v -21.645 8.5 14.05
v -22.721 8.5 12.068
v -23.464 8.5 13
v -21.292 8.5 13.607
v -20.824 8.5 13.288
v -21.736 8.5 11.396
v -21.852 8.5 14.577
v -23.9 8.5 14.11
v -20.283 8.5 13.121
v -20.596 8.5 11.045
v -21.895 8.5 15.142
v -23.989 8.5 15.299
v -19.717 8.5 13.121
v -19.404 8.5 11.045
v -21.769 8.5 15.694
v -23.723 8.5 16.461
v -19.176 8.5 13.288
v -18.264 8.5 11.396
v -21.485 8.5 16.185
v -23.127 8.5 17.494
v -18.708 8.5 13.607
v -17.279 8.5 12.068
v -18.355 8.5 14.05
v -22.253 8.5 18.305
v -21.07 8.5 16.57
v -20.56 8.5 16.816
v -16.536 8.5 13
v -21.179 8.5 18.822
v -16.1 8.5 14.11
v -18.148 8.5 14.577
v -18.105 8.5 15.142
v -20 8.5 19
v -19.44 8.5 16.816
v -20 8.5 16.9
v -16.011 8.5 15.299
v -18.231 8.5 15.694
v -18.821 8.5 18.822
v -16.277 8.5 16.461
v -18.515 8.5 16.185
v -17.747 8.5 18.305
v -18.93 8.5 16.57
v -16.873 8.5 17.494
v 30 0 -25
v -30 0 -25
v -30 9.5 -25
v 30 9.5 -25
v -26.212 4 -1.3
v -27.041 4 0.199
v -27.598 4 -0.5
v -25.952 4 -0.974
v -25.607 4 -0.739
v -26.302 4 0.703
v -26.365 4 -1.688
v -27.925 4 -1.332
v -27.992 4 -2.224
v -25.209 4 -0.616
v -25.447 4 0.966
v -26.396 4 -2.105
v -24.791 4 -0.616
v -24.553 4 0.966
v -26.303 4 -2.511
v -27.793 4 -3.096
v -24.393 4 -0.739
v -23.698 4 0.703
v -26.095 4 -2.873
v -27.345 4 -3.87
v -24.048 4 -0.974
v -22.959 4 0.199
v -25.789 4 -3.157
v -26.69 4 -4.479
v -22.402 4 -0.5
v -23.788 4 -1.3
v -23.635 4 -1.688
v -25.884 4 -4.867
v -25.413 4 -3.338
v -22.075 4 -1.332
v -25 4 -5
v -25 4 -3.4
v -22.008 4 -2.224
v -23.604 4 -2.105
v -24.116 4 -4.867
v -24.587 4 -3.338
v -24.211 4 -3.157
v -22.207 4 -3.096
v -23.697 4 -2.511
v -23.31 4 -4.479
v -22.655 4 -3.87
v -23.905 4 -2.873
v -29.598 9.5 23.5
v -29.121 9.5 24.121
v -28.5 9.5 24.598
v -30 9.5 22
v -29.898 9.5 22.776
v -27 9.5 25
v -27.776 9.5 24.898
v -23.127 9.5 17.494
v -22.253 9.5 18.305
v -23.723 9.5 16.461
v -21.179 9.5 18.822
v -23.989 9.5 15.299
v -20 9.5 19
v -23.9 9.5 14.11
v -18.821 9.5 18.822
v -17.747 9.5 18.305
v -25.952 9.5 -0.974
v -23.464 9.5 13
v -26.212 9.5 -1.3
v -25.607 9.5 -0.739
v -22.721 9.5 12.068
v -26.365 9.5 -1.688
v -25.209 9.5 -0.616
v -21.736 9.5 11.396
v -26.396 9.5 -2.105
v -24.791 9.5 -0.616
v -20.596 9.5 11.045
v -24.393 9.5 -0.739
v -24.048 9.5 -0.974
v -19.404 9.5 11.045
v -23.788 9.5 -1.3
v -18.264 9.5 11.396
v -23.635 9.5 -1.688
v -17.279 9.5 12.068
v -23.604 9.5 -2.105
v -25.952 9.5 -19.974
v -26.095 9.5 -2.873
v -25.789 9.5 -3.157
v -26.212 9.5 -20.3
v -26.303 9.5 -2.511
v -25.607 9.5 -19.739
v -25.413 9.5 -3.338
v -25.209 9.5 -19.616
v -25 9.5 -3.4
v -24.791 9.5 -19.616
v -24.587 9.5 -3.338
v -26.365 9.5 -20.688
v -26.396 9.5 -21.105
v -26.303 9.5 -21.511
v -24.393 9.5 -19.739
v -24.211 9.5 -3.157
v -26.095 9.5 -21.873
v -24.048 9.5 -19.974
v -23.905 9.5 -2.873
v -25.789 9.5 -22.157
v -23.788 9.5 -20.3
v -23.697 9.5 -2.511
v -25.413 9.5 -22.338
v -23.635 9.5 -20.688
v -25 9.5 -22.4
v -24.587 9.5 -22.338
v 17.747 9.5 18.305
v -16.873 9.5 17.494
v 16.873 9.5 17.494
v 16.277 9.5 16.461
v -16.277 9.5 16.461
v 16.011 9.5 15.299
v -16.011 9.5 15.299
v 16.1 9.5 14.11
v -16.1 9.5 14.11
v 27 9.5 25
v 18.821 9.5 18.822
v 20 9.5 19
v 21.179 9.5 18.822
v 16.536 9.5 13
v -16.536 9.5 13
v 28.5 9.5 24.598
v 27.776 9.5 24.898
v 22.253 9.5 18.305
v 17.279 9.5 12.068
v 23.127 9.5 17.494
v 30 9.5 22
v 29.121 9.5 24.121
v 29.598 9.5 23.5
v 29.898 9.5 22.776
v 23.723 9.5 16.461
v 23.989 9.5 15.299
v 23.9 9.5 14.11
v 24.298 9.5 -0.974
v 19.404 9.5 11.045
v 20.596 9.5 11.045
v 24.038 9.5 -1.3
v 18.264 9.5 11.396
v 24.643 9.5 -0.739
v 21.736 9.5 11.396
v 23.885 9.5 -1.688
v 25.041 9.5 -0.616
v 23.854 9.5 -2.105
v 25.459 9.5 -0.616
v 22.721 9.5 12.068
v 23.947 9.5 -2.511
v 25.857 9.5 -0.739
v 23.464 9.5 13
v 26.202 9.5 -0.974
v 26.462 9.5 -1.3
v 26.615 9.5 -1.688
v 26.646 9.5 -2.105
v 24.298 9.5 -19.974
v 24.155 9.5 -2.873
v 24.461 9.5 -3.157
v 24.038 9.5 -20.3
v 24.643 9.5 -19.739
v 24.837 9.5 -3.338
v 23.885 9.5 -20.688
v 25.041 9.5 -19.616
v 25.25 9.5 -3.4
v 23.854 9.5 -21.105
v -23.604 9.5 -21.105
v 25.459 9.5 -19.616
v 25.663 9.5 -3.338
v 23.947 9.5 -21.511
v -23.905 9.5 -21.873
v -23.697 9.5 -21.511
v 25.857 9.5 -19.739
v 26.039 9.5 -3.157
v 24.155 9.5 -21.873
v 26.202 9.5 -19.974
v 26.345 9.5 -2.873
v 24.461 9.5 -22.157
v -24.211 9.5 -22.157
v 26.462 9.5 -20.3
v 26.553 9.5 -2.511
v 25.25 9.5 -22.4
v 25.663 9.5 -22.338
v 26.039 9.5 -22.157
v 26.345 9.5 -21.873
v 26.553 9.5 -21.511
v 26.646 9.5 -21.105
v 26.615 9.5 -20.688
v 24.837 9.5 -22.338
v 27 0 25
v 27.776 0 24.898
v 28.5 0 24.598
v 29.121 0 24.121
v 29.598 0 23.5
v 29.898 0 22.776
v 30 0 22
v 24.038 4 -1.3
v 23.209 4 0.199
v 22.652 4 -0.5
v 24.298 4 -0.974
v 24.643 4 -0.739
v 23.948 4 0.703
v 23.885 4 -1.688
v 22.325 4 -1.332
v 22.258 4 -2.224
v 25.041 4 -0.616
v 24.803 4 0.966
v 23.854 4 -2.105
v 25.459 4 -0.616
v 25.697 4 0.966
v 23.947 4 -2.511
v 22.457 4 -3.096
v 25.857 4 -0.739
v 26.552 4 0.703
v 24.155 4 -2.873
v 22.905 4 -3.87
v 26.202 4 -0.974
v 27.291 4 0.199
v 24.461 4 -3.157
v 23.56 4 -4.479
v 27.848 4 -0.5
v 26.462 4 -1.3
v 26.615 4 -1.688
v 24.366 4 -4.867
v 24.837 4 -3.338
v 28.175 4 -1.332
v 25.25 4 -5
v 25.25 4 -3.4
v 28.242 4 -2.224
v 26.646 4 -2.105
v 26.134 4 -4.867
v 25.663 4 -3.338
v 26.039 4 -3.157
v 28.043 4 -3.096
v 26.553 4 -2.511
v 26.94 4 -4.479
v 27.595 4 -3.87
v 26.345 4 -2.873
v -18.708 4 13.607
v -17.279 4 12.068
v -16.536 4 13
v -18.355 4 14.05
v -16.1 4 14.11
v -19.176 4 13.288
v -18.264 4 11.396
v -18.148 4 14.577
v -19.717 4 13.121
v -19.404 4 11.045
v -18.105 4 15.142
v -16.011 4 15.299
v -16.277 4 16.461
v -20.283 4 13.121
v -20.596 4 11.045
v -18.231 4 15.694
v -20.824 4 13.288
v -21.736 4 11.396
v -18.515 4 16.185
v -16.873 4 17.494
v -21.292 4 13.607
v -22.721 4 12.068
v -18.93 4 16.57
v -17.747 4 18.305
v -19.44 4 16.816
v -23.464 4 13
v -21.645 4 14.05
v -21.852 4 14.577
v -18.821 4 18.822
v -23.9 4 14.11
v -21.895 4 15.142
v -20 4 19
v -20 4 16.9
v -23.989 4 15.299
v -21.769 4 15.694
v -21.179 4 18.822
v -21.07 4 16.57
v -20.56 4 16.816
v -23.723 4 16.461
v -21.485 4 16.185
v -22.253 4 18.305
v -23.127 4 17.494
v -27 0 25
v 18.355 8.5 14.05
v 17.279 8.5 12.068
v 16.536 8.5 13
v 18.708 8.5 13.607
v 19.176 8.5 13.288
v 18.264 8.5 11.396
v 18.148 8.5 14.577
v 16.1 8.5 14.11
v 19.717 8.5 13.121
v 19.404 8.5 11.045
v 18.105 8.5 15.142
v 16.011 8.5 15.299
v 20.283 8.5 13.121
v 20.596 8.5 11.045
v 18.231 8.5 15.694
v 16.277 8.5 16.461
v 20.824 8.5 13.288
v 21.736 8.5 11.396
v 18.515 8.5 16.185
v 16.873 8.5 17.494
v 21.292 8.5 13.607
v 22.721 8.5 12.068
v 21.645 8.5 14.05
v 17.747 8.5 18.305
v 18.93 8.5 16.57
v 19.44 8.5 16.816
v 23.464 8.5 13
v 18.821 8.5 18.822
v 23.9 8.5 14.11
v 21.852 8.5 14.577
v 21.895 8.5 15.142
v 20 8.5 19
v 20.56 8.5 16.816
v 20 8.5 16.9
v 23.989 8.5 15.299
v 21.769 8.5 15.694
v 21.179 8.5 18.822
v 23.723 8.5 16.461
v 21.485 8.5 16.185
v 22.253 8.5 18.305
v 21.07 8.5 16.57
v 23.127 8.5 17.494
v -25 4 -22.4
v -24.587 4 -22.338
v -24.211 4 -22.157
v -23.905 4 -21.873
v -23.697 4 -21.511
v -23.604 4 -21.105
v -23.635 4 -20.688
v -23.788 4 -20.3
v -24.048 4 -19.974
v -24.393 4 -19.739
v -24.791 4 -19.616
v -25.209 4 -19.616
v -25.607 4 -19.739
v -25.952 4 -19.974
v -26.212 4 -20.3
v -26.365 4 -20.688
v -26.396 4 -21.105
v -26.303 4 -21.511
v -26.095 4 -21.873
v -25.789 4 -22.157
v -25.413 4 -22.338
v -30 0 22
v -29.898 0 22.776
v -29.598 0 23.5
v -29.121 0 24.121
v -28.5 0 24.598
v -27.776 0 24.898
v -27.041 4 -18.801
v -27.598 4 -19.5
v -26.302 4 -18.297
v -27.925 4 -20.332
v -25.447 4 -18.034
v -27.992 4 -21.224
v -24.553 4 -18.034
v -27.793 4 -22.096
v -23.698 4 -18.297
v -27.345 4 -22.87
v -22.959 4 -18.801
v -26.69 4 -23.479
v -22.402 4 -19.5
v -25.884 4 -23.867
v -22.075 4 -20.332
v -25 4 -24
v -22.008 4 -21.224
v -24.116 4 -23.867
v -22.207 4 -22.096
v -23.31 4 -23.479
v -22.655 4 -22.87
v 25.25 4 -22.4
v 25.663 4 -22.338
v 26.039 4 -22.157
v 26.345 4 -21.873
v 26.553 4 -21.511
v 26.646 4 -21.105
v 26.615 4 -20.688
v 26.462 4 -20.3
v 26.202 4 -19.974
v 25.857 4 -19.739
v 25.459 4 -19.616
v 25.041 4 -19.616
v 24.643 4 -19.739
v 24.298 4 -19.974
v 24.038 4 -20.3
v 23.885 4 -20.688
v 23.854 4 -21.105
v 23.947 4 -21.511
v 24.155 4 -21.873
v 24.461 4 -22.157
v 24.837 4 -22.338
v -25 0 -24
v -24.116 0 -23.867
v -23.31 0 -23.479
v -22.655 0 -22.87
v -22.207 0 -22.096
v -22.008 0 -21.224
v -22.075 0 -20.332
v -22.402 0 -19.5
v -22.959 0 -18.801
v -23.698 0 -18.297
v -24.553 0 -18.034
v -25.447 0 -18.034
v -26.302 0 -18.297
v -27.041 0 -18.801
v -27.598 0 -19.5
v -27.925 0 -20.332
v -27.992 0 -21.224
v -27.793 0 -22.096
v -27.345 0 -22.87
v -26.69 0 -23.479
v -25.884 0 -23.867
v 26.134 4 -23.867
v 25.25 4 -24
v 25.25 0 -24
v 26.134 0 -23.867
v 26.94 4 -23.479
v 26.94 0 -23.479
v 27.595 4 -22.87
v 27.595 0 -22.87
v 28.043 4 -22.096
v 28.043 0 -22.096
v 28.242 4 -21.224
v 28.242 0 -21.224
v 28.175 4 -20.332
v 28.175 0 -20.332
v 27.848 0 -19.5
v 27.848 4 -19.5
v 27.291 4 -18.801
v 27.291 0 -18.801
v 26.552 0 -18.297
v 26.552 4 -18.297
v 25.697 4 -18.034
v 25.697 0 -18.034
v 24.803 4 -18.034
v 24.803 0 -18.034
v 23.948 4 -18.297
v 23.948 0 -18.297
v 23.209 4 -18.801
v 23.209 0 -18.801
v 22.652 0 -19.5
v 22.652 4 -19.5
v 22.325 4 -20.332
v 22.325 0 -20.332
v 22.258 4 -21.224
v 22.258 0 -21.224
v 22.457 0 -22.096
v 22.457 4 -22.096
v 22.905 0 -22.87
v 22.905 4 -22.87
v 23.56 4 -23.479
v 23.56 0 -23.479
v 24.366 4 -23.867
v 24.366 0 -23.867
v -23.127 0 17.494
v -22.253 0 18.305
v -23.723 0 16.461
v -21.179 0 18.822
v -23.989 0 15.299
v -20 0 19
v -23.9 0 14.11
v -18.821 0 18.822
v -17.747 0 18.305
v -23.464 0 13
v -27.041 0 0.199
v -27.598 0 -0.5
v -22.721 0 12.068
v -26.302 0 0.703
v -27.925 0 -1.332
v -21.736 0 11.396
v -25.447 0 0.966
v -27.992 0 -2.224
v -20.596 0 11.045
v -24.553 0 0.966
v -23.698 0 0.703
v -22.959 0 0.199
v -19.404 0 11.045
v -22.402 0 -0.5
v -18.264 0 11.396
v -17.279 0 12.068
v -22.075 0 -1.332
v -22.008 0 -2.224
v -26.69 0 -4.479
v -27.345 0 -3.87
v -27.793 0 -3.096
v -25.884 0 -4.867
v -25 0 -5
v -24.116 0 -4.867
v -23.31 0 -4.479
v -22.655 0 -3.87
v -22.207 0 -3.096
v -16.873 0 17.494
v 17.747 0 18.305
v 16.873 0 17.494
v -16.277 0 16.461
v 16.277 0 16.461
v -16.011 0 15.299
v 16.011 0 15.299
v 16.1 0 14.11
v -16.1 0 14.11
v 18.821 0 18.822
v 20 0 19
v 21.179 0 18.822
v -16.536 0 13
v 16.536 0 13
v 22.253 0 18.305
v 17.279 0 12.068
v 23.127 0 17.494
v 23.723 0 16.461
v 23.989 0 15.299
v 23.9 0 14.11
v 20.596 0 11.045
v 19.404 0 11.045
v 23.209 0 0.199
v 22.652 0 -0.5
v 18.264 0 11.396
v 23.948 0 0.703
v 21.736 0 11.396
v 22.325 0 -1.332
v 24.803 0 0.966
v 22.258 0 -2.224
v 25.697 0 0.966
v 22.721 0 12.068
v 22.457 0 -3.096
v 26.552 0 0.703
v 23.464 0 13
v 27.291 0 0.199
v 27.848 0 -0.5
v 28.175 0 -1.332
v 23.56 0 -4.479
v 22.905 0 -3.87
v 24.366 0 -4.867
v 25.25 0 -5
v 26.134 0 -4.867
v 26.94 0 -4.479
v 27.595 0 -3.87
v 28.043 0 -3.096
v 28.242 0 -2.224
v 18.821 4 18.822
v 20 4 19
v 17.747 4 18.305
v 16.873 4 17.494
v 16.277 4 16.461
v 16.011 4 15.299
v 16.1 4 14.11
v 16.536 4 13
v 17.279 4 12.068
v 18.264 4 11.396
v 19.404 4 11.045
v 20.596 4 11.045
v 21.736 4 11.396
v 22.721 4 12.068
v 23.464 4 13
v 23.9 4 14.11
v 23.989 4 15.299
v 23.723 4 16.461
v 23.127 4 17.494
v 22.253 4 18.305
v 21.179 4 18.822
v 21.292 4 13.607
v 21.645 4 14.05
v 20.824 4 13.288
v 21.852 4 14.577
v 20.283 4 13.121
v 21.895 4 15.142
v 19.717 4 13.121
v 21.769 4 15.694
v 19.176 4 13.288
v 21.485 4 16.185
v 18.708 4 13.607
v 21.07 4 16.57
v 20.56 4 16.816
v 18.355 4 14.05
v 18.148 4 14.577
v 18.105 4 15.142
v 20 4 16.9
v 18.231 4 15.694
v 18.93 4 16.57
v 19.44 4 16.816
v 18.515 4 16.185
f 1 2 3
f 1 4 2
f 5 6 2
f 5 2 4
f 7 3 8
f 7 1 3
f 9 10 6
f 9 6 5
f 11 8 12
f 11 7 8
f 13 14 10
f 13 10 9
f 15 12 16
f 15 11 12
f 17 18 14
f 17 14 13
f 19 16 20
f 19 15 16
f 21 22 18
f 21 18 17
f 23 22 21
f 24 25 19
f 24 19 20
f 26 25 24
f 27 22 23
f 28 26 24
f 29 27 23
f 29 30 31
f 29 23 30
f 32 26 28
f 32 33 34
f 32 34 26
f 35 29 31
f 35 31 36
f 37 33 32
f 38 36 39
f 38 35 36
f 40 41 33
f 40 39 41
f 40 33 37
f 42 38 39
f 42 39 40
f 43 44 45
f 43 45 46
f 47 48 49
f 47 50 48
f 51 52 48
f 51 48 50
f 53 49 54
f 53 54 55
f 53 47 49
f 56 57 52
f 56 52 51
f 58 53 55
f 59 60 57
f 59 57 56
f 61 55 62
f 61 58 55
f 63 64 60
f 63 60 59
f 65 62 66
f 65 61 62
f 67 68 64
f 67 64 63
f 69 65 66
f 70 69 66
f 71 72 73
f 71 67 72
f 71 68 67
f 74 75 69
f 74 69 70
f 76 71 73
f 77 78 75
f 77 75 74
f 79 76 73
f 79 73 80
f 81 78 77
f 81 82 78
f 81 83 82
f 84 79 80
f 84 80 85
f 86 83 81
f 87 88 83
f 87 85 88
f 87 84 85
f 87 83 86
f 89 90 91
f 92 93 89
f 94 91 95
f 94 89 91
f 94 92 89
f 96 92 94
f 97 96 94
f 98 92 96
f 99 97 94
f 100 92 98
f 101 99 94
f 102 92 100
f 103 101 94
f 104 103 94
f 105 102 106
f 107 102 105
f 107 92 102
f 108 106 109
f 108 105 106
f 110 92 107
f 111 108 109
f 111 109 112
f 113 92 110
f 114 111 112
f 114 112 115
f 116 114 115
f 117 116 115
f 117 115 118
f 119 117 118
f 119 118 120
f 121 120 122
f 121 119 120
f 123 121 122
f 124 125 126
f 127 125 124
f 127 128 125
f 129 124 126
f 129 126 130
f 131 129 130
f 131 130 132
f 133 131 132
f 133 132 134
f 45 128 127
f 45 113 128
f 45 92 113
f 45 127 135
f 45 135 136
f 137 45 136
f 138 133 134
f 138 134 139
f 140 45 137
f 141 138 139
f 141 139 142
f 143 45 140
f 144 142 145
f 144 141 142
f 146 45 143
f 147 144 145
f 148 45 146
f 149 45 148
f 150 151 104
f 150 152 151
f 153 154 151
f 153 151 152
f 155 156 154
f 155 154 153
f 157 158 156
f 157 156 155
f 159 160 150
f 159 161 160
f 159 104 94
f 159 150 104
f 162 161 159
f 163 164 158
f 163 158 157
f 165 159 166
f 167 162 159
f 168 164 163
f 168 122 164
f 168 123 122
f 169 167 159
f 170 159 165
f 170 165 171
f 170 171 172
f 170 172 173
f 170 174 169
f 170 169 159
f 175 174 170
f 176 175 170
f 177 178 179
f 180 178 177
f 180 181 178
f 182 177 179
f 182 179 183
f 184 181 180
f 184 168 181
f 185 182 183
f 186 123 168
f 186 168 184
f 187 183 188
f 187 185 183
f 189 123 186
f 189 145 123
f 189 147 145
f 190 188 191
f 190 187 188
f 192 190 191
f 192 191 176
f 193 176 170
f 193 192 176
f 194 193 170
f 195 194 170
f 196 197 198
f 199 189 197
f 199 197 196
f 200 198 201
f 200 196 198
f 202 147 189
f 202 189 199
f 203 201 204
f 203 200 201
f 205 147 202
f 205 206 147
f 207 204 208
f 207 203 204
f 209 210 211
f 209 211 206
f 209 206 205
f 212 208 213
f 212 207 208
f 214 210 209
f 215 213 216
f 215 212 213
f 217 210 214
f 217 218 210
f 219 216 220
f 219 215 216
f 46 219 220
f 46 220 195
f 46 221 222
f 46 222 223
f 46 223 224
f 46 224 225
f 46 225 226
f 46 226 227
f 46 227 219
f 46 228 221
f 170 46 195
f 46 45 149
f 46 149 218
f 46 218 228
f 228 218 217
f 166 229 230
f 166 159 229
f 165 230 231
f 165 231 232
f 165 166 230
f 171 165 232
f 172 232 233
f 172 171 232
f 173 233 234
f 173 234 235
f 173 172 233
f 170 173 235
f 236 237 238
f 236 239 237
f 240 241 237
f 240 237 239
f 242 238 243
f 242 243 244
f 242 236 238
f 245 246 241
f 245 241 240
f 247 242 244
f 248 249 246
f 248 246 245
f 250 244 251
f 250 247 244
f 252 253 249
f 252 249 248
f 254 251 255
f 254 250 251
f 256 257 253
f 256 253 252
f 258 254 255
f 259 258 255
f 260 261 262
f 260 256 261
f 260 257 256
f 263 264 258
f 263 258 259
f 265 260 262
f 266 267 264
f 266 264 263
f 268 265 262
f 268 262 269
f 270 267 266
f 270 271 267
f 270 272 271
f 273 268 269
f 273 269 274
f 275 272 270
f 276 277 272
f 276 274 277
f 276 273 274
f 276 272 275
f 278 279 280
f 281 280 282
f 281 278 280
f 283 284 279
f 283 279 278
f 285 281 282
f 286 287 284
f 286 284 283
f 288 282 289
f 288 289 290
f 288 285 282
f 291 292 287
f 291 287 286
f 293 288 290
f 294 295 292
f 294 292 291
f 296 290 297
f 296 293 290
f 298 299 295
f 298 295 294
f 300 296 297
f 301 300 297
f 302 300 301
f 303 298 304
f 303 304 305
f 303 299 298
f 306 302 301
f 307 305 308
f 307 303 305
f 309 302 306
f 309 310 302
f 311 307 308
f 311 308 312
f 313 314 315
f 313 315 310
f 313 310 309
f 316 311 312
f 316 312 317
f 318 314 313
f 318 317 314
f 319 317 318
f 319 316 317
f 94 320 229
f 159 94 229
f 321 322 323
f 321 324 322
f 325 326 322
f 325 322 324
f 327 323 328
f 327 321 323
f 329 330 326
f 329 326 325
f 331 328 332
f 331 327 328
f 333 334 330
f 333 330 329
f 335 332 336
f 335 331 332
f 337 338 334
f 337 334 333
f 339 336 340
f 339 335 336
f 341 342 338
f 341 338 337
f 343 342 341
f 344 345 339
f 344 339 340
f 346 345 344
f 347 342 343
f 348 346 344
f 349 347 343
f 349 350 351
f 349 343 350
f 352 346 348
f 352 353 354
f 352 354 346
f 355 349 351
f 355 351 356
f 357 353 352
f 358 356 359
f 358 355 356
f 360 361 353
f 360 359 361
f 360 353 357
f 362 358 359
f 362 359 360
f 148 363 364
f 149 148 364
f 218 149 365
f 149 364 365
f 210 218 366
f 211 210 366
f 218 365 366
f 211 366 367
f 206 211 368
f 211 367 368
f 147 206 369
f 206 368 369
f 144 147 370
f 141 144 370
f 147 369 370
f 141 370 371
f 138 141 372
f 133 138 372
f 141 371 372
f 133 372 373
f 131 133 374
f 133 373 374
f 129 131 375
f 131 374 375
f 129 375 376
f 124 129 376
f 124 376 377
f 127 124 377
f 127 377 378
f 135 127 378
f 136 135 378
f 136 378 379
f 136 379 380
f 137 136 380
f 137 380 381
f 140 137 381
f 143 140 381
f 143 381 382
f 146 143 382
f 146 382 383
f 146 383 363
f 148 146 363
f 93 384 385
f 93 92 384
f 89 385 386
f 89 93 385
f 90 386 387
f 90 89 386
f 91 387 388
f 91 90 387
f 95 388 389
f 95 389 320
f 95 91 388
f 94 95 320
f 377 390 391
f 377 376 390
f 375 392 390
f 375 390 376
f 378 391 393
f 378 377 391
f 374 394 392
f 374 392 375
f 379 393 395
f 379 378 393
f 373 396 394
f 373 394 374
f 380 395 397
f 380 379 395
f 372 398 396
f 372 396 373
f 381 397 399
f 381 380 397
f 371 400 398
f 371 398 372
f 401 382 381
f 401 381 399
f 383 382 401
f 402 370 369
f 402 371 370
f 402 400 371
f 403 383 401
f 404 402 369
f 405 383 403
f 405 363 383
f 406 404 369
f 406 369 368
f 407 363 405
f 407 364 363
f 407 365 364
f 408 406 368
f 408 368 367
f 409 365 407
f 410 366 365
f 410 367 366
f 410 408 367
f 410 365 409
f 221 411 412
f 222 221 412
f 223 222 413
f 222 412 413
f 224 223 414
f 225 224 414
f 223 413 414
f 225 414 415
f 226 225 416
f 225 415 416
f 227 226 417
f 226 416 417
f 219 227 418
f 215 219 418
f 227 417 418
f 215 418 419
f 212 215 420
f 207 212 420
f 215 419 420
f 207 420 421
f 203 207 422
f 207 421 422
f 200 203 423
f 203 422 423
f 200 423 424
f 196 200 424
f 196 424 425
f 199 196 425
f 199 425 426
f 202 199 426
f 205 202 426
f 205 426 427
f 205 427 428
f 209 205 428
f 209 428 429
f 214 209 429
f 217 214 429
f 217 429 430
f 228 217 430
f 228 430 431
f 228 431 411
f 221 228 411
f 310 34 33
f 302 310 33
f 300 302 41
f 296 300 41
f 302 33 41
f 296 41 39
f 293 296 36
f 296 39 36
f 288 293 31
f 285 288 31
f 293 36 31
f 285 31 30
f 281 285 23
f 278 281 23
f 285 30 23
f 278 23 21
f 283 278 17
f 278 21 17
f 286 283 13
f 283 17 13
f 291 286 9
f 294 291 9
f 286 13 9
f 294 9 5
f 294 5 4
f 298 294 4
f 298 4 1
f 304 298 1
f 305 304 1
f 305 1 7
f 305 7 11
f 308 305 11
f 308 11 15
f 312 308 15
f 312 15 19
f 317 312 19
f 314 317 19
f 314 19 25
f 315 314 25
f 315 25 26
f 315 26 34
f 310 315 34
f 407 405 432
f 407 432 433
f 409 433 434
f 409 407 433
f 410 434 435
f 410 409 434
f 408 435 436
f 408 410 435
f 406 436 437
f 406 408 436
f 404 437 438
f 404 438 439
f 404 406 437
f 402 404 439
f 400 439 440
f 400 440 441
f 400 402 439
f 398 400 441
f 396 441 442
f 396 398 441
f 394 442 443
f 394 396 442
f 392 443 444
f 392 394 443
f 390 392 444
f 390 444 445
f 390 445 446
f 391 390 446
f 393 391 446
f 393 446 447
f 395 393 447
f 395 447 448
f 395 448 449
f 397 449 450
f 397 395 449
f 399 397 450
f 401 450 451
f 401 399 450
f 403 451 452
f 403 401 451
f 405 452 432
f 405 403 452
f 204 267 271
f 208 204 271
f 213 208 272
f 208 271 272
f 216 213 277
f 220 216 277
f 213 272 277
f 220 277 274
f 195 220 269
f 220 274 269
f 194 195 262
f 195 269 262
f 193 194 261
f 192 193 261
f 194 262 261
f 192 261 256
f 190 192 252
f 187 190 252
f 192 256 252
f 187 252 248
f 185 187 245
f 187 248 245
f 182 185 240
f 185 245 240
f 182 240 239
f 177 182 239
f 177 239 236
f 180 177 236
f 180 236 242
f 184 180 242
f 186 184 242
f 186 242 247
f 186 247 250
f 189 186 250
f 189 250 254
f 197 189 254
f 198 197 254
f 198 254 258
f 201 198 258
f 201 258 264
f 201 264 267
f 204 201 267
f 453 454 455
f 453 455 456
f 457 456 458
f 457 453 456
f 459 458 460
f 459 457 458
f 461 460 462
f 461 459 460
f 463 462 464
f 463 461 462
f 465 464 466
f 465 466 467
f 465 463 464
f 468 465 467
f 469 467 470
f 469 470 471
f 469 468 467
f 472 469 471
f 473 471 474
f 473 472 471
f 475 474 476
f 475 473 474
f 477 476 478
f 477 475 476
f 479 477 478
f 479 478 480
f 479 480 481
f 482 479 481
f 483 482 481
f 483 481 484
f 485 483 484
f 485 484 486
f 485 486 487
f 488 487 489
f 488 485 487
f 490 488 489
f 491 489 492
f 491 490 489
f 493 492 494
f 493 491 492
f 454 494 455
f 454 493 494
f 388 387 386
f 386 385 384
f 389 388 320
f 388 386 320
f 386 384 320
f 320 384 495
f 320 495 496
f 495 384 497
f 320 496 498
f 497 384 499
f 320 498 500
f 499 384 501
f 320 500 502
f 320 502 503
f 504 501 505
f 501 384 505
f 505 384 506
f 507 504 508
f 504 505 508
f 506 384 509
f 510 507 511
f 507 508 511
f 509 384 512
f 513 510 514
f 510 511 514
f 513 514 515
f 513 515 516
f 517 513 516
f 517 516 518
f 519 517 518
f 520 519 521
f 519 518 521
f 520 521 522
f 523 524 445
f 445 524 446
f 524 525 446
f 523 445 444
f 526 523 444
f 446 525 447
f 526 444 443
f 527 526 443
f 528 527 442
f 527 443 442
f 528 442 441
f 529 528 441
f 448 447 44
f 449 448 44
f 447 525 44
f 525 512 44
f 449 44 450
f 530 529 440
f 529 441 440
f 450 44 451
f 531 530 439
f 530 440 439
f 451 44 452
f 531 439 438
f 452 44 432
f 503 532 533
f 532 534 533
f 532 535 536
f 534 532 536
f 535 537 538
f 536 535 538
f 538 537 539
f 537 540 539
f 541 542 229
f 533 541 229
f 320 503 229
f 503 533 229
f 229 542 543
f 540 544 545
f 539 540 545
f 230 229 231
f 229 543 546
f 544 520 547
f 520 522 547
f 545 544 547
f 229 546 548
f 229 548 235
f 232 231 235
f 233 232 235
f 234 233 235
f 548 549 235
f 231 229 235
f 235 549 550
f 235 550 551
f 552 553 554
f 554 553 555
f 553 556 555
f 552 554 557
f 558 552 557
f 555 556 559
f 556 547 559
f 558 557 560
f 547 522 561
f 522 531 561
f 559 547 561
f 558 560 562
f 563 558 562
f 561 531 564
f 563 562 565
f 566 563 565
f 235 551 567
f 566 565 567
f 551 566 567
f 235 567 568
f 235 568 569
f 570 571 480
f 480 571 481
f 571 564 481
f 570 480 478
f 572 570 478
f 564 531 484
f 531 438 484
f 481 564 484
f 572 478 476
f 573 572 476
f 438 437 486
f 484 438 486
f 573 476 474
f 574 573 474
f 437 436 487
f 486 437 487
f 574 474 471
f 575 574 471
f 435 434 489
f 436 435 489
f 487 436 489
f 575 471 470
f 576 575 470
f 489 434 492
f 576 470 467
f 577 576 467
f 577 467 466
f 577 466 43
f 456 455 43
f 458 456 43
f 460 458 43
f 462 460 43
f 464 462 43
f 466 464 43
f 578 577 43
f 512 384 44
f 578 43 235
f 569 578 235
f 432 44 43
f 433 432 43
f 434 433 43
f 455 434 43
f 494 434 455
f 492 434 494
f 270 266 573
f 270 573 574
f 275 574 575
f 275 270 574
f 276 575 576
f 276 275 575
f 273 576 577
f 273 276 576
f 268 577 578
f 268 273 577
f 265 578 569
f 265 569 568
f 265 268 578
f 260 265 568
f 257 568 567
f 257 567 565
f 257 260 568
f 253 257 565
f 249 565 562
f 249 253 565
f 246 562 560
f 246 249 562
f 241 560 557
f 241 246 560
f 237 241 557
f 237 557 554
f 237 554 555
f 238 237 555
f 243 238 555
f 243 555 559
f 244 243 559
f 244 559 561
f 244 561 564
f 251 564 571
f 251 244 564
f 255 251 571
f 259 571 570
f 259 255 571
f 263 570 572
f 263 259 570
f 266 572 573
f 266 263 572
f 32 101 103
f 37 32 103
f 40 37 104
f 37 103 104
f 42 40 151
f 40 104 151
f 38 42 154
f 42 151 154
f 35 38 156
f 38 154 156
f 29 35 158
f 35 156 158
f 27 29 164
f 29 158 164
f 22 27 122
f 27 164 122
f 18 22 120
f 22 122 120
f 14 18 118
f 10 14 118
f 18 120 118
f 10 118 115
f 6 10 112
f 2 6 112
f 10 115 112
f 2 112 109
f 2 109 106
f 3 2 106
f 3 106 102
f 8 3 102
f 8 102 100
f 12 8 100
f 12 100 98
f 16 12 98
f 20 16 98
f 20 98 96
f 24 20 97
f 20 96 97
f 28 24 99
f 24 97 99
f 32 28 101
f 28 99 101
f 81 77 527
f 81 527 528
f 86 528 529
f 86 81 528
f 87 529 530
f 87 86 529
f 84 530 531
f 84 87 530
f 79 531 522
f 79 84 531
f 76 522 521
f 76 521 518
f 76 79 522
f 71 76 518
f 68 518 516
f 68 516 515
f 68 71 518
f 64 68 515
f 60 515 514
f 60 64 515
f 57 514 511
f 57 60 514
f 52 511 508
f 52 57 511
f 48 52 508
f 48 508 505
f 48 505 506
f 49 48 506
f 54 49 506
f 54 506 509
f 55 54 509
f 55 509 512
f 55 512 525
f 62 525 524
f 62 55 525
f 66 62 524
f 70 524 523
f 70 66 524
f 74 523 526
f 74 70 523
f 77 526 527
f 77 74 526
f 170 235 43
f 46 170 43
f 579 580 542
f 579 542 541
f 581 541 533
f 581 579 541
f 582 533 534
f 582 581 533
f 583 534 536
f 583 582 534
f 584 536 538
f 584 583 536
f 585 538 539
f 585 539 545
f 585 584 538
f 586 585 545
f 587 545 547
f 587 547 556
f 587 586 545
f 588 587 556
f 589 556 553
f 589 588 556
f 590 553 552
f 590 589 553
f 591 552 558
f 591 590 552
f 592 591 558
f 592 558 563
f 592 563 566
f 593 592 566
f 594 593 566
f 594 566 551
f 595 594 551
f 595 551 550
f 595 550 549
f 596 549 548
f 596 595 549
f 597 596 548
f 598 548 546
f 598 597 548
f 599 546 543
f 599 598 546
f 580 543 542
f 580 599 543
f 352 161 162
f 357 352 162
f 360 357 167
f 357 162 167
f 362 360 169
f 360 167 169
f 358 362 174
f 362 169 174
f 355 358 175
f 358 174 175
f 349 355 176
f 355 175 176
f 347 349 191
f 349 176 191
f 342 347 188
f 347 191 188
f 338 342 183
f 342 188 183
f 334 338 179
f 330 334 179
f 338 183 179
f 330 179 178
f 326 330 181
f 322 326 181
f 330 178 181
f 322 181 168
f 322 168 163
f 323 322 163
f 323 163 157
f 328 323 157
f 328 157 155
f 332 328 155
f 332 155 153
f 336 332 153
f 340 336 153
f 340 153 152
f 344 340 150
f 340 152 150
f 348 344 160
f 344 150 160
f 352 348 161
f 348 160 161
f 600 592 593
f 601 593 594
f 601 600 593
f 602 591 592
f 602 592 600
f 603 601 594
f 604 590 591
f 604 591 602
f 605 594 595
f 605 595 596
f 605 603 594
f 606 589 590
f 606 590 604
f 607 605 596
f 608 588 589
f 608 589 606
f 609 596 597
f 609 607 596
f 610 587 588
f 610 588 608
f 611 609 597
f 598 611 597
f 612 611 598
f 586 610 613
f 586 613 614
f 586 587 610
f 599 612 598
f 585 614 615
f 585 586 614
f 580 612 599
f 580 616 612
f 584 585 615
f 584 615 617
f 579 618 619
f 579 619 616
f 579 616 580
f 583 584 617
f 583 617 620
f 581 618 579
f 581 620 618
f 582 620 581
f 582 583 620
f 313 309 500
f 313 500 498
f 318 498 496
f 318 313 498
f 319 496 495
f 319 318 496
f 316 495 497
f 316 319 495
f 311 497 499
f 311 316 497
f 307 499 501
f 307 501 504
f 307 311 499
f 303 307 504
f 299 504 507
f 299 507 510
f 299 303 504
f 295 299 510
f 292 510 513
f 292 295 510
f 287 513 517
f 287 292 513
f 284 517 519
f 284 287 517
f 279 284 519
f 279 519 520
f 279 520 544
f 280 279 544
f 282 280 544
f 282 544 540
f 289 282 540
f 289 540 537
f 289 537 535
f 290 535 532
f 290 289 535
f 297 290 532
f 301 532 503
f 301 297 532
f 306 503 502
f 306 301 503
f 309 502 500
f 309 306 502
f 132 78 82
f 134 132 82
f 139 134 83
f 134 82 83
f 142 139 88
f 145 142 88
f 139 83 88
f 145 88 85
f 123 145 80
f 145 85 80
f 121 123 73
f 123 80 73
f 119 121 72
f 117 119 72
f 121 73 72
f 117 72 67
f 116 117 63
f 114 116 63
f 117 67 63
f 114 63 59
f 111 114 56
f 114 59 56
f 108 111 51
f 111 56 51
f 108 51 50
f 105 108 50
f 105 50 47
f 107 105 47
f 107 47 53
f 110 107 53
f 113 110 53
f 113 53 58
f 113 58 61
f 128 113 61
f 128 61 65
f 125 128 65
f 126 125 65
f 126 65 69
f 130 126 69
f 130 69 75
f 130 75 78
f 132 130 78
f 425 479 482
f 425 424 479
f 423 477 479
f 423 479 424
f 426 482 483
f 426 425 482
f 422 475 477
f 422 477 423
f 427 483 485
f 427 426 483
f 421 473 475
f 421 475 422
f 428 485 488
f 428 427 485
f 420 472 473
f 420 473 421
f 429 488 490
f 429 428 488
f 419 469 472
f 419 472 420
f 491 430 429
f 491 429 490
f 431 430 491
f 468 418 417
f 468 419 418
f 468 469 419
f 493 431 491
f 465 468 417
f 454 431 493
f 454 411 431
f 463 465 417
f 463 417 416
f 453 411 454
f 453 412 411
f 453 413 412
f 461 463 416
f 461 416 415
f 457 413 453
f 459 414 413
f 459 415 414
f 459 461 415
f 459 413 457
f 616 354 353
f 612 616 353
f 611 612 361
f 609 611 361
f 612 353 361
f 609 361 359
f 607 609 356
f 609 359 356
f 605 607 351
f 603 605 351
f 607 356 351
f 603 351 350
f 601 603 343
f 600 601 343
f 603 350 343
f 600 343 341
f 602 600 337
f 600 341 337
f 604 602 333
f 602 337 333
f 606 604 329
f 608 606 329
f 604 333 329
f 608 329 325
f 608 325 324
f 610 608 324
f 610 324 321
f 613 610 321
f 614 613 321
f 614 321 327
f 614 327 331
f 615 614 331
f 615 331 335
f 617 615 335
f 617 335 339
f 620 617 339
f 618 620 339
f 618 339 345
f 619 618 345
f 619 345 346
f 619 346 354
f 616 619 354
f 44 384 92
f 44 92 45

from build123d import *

# Parameters (mm, degrees)
SKETCH_1_W          = 60
SKETCH_1_H          = 50
EXTRUDE_1_DEPTH     = 9.5
FILLET_1_R          = 3
SKETCH_2_R          = 4
CUT_EXTRUDE_1_DEPTH = 1
SKETCH_5_R          = 1.9
CUT_EXTRUDE_3_DEPTH = 41.190172928
SKETCH_6_R          = 1.4
CUT_EXTRUDE_4_DEPTH = 41.190172928
CUT_EXTRUDE_START   = -4
SKETCH_7_R          = 4
SKETCH_7_R_2        = 3
CUT_EXTRUDE_5_DEPTH = 4


with BuildPart() as part:
    # 草图1 → 凸台-拉伸1 (new body)
    with BuildSketch(Plane(origin=(0, 0, 0), x_dir=(1, 0, 0), z_dir=(0, 1, 0))):
        Rectangle(SKETCH_1_W, SKETCH_1_H)
    extrude(amount=EXTRUDE_1_DEPTH)

    # 圆角1
    fillet_1_edges = [part.edges().sort_by_distance(p)[0] for p in [
        (30, 4.75, 25),
        (-30, 4.75, 25),
    ]]
    fillet(fillet_1_edges, radius=FILLET_1_R)

    # 草图2 → 切除-拉伸1 (cut)
    with BuildSketch(Plane(origin=(0, 9.5, 0), x_dir=(1, 0, 0), z_dir=(0, 1, 0))):
        with Locations(Location((-20, -15, 0), (0, 0, 270))):
            Circle(SKETCH_2_R)
        with Locations(Location((20, -15, 0), (0, 0, 270))):
            Circle(SKETCH_2_R)
    extrude(amount=-CUT_EXTRUDE_1_DEPTH, mode=Mode.SUBTRACT)

    # 草图5 → 切除-拉伸3 (cut, through all)
    with BuildSketch(Plane(origin=(0, 9.5, 0), x_dir=(1, 0, 0), z_dir=(0, 1, 0))):
        with Locations(Location((-20, -15, 0), (0, 0, 270))):
            Circle(SKETCH_5_R)
        with Locations(Location((20, -15, 0), (0, 0, 270))):
            Circle(SKETCH_5_R)
    extrude(amount=-CUT_EXTRUDE_3_DEPTH, mode=Mode.SUBTRACT)

    # 草图6 → 切除-拉伸4 (cut, through all)
    with BuildSketch(Plane.XZ):
        with Locations(Location((-25, -21, 0), (0, 0, 270))):
            Circle(SKETCH_6_R)
        with Locations(Location((-25, -2, 0), (0, 0, 270))):
            Circle(SKETCH_6_R)
        with Locations(Location((25.25, -21, 0), (0, 0, 270))):
            Circle(SKETCH_6_R)
        with Locations(Location((25.25, -2, 0), (0, 0, 270))):
            Circle(SKETCH_6_R)
    extrude(amount=-CUT_EXTRUDE_4_DEPTH, mode=Mode.SUBTRACT)

    # 草图7 → 切除-拉伸5 (cut)
    with BuildSketch(Plane.XZ.offset(CUT_EXTRUDE_START)):
        with Locations(Location((-20, 15, 0), (0, 0, 90))):
            Circle(SKETCH_7_R)
        with Locations(Location((20, 15, 0), (0, 0, 90))):
            Circle(SKETCH_7_R)
        with Locations(Location((25.25, -2, 0), (0, 0, 270))):
            Circle(SKETCH_7_R_2)
        with Locations(Location((25.25, -21, 0), (0, 0, 270))):
            Circle(SKETCH_7_R_2)
        with Locations(Location((-25, -21, 0), (0, 0, 270))):
            Circle(SKETCH_7_R_2)
        with Locations(Location((-25, -2, 0), (0, 0, 270))):
            Circle(SKETCH_7_R_2)
    extrude(amount=CUT_EXTRUDE_5_DEPTH, mode=Mode.SUBTRACT)


solid = part.part
